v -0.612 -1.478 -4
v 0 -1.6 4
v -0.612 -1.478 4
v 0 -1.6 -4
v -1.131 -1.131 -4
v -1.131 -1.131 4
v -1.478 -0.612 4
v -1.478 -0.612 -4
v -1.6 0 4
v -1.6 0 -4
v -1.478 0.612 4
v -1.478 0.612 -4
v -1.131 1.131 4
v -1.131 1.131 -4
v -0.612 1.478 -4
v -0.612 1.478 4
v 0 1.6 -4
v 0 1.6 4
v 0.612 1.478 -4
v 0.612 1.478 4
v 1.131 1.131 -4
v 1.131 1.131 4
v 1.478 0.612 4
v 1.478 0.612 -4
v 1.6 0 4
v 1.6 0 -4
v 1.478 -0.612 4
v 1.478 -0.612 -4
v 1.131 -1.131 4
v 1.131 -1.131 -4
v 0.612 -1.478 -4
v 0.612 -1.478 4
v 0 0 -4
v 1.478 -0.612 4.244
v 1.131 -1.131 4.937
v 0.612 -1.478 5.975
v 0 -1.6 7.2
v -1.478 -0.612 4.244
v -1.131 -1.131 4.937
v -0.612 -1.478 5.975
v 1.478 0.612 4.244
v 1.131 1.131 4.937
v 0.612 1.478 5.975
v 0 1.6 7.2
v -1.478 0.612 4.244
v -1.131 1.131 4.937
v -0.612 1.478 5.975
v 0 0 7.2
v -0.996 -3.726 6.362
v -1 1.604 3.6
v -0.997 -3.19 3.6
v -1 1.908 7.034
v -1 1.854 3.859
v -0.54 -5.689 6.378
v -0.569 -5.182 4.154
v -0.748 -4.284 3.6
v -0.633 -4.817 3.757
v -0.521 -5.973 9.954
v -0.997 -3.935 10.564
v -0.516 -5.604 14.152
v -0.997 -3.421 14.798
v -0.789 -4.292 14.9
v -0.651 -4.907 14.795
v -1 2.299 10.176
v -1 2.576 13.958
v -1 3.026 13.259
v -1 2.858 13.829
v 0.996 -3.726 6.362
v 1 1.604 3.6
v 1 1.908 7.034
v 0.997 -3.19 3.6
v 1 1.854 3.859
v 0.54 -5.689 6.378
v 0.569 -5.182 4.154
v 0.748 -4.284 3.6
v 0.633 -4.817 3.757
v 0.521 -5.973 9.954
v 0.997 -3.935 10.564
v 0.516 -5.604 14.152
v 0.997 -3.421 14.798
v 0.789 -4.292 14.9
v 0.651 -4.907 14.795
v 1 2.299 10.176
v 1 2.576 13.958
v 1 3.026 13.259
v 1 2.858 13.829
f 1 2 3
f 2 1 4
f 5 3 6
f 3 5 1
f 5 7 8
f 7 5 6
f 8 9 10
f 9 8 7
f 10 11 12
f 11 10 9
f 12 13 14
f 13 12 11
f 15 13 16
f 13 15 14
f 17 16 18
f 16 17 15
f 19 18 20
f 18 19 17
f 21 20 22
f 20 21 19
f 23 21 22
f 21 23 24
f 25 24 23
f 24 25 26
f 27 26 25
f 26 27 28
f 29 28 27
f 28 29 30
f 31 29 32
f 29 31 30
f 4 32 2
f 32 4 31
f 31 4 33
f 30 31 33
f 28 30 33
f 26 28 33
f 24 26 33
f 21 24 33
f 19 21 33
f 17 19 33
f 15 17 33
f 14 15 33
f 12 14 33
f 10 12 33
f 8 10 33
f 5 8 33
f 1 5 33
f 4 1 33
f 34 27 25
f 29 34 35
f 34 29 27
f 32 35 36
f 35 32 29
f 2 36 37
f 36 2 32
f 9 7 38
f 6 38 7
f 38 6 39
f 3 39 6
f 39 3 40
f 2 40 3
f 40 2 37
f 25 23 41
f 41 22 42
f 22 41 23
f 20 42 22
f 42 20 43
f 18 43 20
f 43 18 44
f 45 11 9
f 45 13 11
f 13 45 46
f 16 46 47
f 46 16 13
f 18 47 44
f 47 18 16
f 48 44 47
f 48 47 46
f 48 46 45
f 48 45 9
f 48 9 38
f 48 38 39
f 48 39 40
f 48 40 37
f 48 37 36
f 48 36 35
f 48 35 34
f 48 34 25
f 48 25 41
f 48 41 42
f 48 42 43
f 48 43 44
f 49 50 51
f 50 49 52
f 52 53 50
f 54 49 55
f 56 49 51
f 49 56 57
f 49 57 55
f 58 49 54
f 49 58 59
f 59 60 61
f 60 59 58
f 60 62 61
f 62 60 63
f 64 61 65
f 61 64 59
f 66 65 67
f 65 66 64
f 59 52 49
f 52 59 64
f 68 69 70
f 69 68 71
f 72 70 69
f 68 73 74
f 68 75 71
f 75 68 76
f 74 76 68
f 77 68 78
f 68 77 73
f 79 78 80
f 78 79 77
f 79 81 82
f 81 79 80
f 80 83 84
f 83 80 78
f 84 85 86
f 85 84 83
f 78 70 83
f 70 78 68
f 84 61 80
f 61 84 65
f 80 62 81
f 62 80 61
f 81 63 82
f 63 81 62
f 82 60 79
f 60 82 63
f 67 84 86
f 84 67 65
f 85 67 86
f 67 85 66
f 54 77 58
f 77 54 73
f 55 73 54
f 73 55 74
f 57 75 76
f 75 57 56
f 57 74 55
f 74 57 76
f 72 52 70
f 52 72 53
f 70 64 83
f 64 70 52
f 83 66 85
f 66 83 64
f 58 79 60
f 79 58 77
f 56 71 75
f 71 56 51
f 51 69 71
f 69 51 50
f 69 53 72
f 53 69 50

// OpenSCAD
// file: ../p/4-4edge.scad
use <../lib.scad>
function ldraw_lib__4_4edge() = [
// 0 Circle 1.0
// 0 Name: 4-4edge.dat
// 0 Author: James Jessiman
// 0 !LDRAW_ORG Primitive UPDATE 2017-01
// 0 !LICENSE Licensed under CC BY 4.0 : see CAreadme.txt
// 
// 0 BFC CERTIFY CCW
  [0,"BFC","CERTIFY"],
  [0,"BFC","CCW"],
// 
// 0 !HISTORY 1998-12-15 [PTadmin] Official Update 1998-10
// 0 !HISTORY 2005-12-28 [PTadmin] Official Update 2005-01
// 0 !HISTORY 2007-06-24 [PTadmin] Header formatted for Contributor Agreement
// 0 !HISTORY 2008-07-01 [PTadmin] Official Update 2008-01
// 0 !HISTORY 2017-01-15 [Steffen] BFCed
// 0 !HISTORY 2017-12-30 [PTadmin] Official Update 2017-01
// 
// 
// 2 24 1 0 0 0.9239 0 0.3827
  [2,24,1,0,0,0.9239,0,0.3827],
// 2 24 0.9239 0 0.3827 0.7071 0 0.7071
  [2,24,0.9239,0,0.3827,0.7071,0,0.7071],
// 2 24 0.7071 0 0.7071 0.3827 0 0.9239
  [2,24,0.7071,0,0.7071,0.3827,0,0.9239],
// 2 24 0.3827 0 0.9239 0 0 1
  [2,24,0.3827,0,0.9239,0,0,1],
// 2 24 0 0 1 -0.3827 0 0.9239
  [2,24,0,0,1,-0.3827,0,0.9239],
// 2 24 -0.3827 0 0.9239 -0.7071 0 0.7071
  [2,24,-0.3827,0,0.9239,-0.7071,0,0.7071],
// 2 24 -0.7071 0 0.7071 -0.9239 0 0.3827
  [2,24,-0.7071,0,0.7071,-0.9239,0,0.3827],
// 2 24 -0.9239 0 0.3827 -1 0 -0
  [2,24,-0.9239,0,0.3827,-1,0,-0],
// 2 24 -1 0 -0 -0.9239 0 -0.3827
  [2,24,-1,0,-0,-0.9239,0,-0.3827],
// 2 24 -0.9239 0 -0.3827 -0.7071 0 -0.7071
  [2,24,-0.9239,0,-0.3827,-0.7071,0,-0.7071],
// 2 24 -0.7071 0 -0.7071 -0.3827 0 -0.9239
  [2,24,-0.7071,0,-0.7071,-0.3827,0,-0.9239],
// 2 24 -0.3827 0 -0.9239 0 0 -1
  [2,24,-0.3827,0,-0.9239,0,0,-1],
// 2 24 0 0 -1 0.3827 0 -0.9239
  [2,24,0,0,-1,0.3827,0,-0.9239],
// 2 24 0.3827 0 -0.9239 0.7071 0 -0.7071
  [2,24,0.3827,0,-0.9239,0.7071,0,-0.7071],
// 2 24 0.7071 0 -0.7071 0.9239 0 -0.3827
  [2,24,0.7071,0,-0.7071,0.9239,0,-0.3827],
// 2 24 0.9239 0 -0.3827 1 0 0
  [2,24,0.9239,0,-0.3827,1,0,0],
];
module ldraw_lib__4_4edge(step=0, col=false, unit=2/5, alt=false, line=0.2, solid=!$preview)
    makepoly(ldraw_lib__4_4edge(), step=step, col=col, unit=unit, alt=alt, line=line, solid=solid);
ldraw_lib__4_4edge(line=0.2);
// file: ../p/4-4disc.scad
use <../lib.scad>
function ldraw_lib__4_4disc() = [
// 0 Disc 1.0
// 0 Name: 4-4disc.dat
// 0 Author: James Jessiman
// 0 !LDRAW_ORG Primitive UPDATE 2002-02
// 0 !LICENSE Licensed under CC BY 4.0 : see CAreadme.txt
// 
// 0 BFC CERTIFY CCW
  [0,"BFC","CERTIFY"],
  [0,"BFC","CCW"],
// 
// 0 !HISTORY 1998-12-15 [PTadmin] Official Update 1998-10
// 0 !HISTORY 2002-03-23 [sbliss] Added BFC statement
// 0 !HISTORY 2002-04-25 [PTadmin] Official Update 2002-02
// 0 !HISTORY 2007-06-24 [PTadmin] Header formatted for Contributor Agreement
// 0 !HISTORY 2008-07-01 [PTadmin] Official Update 2008-01
// 
// 
// 3 16 0 0 0 1 0 0 0.9239 0 0.3827
  [3,16,0,0,0,1,0,0,0.9239,0,0.3827],
// 3 16 0 0 0 0.9239 0 0.3827 0.7071 0 0.7071
  [3,16,0,0,0,0.9239,0,0.3827,0.7071,0,0.7071],
// 3 16 0 0 0 0.7071 0 0.7071 0.3827 0 0.9239
  [3,16,0,0,0,0.7071,0,0.7071,0.3827,0,0.9239],
// 3 16 0 0 0 0.3827 0 0.9239 0 0 1
  [3,16,0,0,0,0.3827,0,0.9239,0,0,1],
// 3 16 0 0 0 0 0 1 -0.3827 0 0.9239
  [3,16,0,0,0,0,0,1,-0.3827,0,0.9239],
// 3 16 0 0 0 -0.3827 0 0.9239 -0.7071 0 0.7071
  [3,16,0,0,0,-0.3827,0,0.9239,-0.7071,0,0.7071],
// 3 16 0 0 0 -0.7071 0 0.7071 -0.9239 0 0.3827
  [3,16,0,0,0,-0.7071,0,0.7071,-0.9239,0,0.3827],
// 3 16 0 0 0 -0.9239 0 0.3827 -1 0 -0
  [3,16,0,0,0,-0.9239,0,0.3827,-1,0,-0],
// 3 16 0 0 0 -1 0 -0 -0.9239 0 -0.3827
  [3,16,0,0,0,-1,0,-0,-0.9239,0,-0.3827],
// 3 16 0 0 0 -0.9239 0 -0.3827 -0.7071 0 -0.7071
  [3,16,0,0,0,-0.9239,0,-0.3827,-0.7071,0,-0.7071],
// 3 16 0 0 0 -0.7071 0 -0.7071 -0.3827 0 -0.9239
  [3,16,0,0,0,-0.7071,0,-0.7071,-0.3827,0,-0.9239],
// 3 16 0 0 0 -0.3827 0 -0.9239 0 0 -1
  [3,16,0,0,0,-0.3827,0,-0.9239,0,0,-1],
// 3 16 0 0 0 0 0 -1 0.3827 0 -0.9239
  [3,16,0,0,0,0,0,-1,0.3827,0,-0.9239],
// 3 16 0 0 0 0.3827 0 -0.9239 0.7071 0 -0.7071
  [3,16,0,0,0,0.3827,0,-0.9239,0.7071,0,-0.7071],
// 3 16 0 0 0 0.7071 0 -0.7071 0.9239 0 -0.3827
  [3,16,0,0,0,0.7071,0,-0.7071,0.9239,0,-0.3827],
// 3 16 0 0 0 0.9239 0 -0.3827 1 0 0
  [3,16,0,0,0,0.9239,0,-0.3827,1,0,0],
// 0
];
module ldraw_lib__4_4disc(step=0, col=false, unit=2/5, alt=false, line=0.2, solid=!$preview)
    makepoly(ldraw_lib__4_4disc(), step=step, col=col, unit=unit, alt=alt, line=line, solid=solid);
ldraw_lib__4_4disc(line=0.2);
// file: ../p/4-4cyli.scad
use <../lib.scad>
function ldraw_lib__4_4cyli() = [
// 0 Cylinder 1.0
// 0 Name: 4-4cyli.dat
// 0 Author: James Jessiman
// 0 !LDRAW_ORG Primitive UPDATE 2005-01
// 0 !LICENSE Licensed under CC BY 4.0 : see CAreadme.txt
// 
// 0 BFC CERTIFY CCW
  [0,"BFC","CERTIFY"],
  [0,"BFC","CCW"],
// 
// 0 !HISTORY 1998-12-15 [PTadmin] Official Update 1998-10
// 0 !HISTORY 2002-03-23 [sbliss] Added BFC statement; merged headers from files in distributions LDraw 0.27 and Complete.
// 0 !HISTORY 2002-04-25 [PTadmin] Official Update 2002-02
// 0 !HISTORY 2004-12-14 [guyvivan] BFC CCW
// 0 !HISTORY 2005-12-28 [PTadmin] Official Update 2005-01
// 0 !HISTORY 2007-06-24 [PTadmin] Header formatted for Contributor Agreement
// 0 !HISTORY 2008-07-01 [PTadmin] Official Update 2008-01
// 
// 
// 4 16 1 1 0 0.9239 1 0.3827 0.9239 0 0.3827 1 0 0
  [4,16,1,1,0,0.9239,1,0.3827,0.9239,0,0.3827,1,0,0],
// 5 24 1 0 0 1 1 0 0.9239 0 0.3827 0.9239 0 -0.3827
  [5,24,1,0,0,1,1,0,0.9239,0,0.3827,0.9239,0,-0.3827],
// 4 16 0.9239 1 0.3827 0.7071 1 0.7071 0.7071 0 0.7071 0.9239 0 0.3827
  [4,16,0.9239,1,0.3827,0.7071,1,0.7071,0.7071,0,0.7071,0.9239,0,0.3827],
// 5 24 0.9239 0 0.3827 0.9239 1 0.3827 0.7071 0 0.7071 1 0 0
  [5,24,0.9239,0,0.3827,0.9239,1,0.3827,0.7071,0,0.7071,1,0,0],
// 4 16 0.7071 1 0.7071 0.3827 1 0.9239 0.3827 0 0.9239 0.7071 0 0.7071
  [4,16,0.7071,1,0.7071,0.3827,1,0.9239,0.3827,0,0.9239,0.7071,0,0.7071],
// 5 24 0.7071 0 0.7071 0.7071 1 0.7071 0.3827 0 0.9239 0.9239 0 0.3827
  [5,24,0.7071,0,0.7071,0.7071,1,0.7071,0.3827,0,0.9239,0.9239,0,0.3827],
// 4 16 0.3827 1 0.9239 0 1 1 0 0 1 0.3827 0 0.9239
  [4,16,0.3827,1,0.9239,0,1,1,0,0,1,0.3827,0,0.9239],
// 5 24 0.3827 0 0.9239 0.3827 1 0.9239 0 0 1 0.7071 0 0.7071
  [5,24,0.3827,0,0.9239,0.3827,1,0.9239,0,0,1,0.7071,0,0.7071],
// 4 16 0 1 1 -0.3827 1 0.9239 -0.3827 0 0.9239 0 0 1
  [4,16,0,1,1,-0.3827,1,0.9239,-0.3827,0,0.9239,0,0,1],
// 5 24 0 0 1 0 1 1 -0.3827 0 0.9239 0.3827 0 0.9239
  [5,24,0,0,1,0,1,1,-0.3827,0,0.9239,0.3827,0,0.9239],
// 4 16 -0.3827 1 0.9239 -0.7071 1 0.7071 -0.7071 0 0.7071 -0.3827 0 0.9239
  [4,16,-0.3827,1,0.9239,-0.7071,1,0.7071,-0.7071,0,0.7071,-0.3827,0,0.9239],
// 5 24 -0.3827 0 0.9239 -0.3827 1 0.9239 -0.7071 0 0.7071 0 0 1
  [5,24,-0.3827,0,0.9239,-0.3827,1,0.9239,-0.7071,0,0.7071,0,0,1],
// 4 16 -0.7071 1 0.7071 -0.9239 1 0.3827 -0.9239 0 0.3827 -0.7071 0 0.7071
  [4,16,-0.7071,1,0.7071,-0.9239,1,0.3827,-0.9239,0,0.3827,-0.7071,0,0.7071],
// 5 24 -0.7071 0 0.7071 -0.7071 1 0.7071 -0.9239 0 0.3827 -0.3827 0 0.9239
  [5,24,-0.7071,0,0.7071,-0.7071,1,0.7071,-0.9239,0,0.3827,-0.3827,0,0.9239],
// 4 16 -0.9239 1 0.3827 -1 1 0 -1 0 0 -0.9239 0 0.3827
  [4,16,-0.9239,1,0.3827,-1,1,0,-1,0,0,-0.9239,0,0.3827],
// 5 24 -0.9239 0 0.3827 -0.9239 1 0.3827 -1 0 0 -0.7071 0 0.7071
  [5,24,-0.9239,0,0.3827,-0.9239,1,0.3827,-1,0,0,-0.7071,0,0.7071],
// 4 16 -1 1 0 -0.9239 1 -0.3827 -0.9239 0 -0.3827 -1 0 0
  [4,16,-1,1,0,-0.9239,1,-0.3827,-0.9239,0,-0.3827,-1,0,0],
// 5 24 -1 0 0 -1 1 0 -0.9239 0 -0.3827 -0.9239 0 0.3827
  [5,24,-1,0,0,-1,1,0,-0.9239,0,-0.3827,-0.9239,0,0.3827],
// 4 16 -0.9239 1 -0.3827 -0.7071 1 -0.7071 -0.7071 0 -0.7071 -0.9239 0 -0.3827
  [4,16,-0.9239,1,-0.3827,-0.7071,1,-0.7071,-0.7071,0,-0.7071,-0.9239,0,-0.3827],
// 5 24 -0.9239 0 -0.3827 -0.9239 1 -0.3827 -0.7071 0 -0.7071 -1 0 0
  [5,24,-0.9239,0,-0.3827,-0.9239,1,-0.3827,-0.7071,0,-0.7071,-1,0,0],
// 4 16 -0.7071 1 -0.7071 -0.3827 1 -0.9239 -0.3827 0 -0.9239 -0.7071 0 -0.7071
  [4,16,-0.7071,1,-0.7071,-0.3827,1,-0.9239,-0.3827,0,-0.9239,-0.7071,0,-0.7071],
// 5 24 -0.7071 0 -0.7071 -0.7071 1 -0.7071 -0.3827 0 -0.9239 -0.9239 0 -0.3827
  [5,24,-0.7071,0,-0.7071,-0.7071,1,-0.7071,-0.3827,0,-0.9239,-0.9239,0,-0.3827],
// 4 16 -0.3827 1 -0.9239 0 1 -1 0 0 -1 -0.3827 0 -0.9239
  [4,16,-0.3827,1,-0.9239,0,1,-1,0,0,-1,-0.3827,0,-0.9239],
// 5 24 -0.3827 0 -0.9239 -0.3827 1 -0.9239 0 0 -1 -0.7071 0 -0.7071
  [5,24,-0.3827,0,-0.9239,-0.3827,1,-0.9239,0,0,-1,-0.7071,0,-0.7071],
// 4 16 0 1 -1 0.3827 1 -0.9239 0.3827 0 -0.9239 0 0 -1
  [4,16,0,1,-1,0.3827,1,-0.9239,0.3827,0,-0.9239,0,0,-1],
// 5 24 0 0 -1 0 1 -1 0.3827 0 -0.9239 -0.3827 0 -0.9239
  [5,24,0,0,-1,0,1,-1,0.3827,0,-0.9239,-0.3827,0,-0.9239],
// 4 16 0.3827 1 -0.9239 0.7071 1 -0.7071 0.7071 0 -0.7071 0.3827 0 -0.9239
  [4,16,0.3827,1,-0.9239,0.7071,1,-0.7071,0.7071,0,-0.7071,0.3827,0,-0.9239],
// 5 24 0.3827 0 -0.9239 0.3827 1 -0.9239 0.7071 0 -0.7071 0 0 -1
  [5,24,0.3827,0,-0.9239,0.3827,1,-0.9239,0.7071,0,-0.7071,0,0,-1],
// 4 16 0.7071 1 -0.7071 0.9239 1 -0.3827 0.9239 0 -0.3827 0.7071 0 -0.7071
  [4,16,0.7071,1,-0.7071,0.9239,1,-0.3827,0.9239,0,-0.3827,0.7071,0,-0.7071],
// 5 24 0.7071 0 -0.7071 0.7071 1 -0.7071 0.9239 0 -0.3827 0.3827 0 -0.9239
  [5,24,0.7071,0,-0.7071,0.7071,1,-0.7071,0.9239,0,-0.3827,0.3827,0,-0.9239],
// 4 16 0.9239 1 -0.3827 1 1 0 1 0 0 0.9239 0 -0.3827
  [4,16,0.9239,1,-0.3827,1,1,0,1,0,0,0.9239,0,-0.3827],
// 5 24 0.9239 0 -0.3827 0.9239 1 -0.3827 1 0 0 0.7071 0 -0.7071
  [5,24,0.9239,0,-0.3827,0.9239,1,-0.3827,1,0,0,0.7071,0,-0.7071],
// 0
];
module ldraw_lib__4_4cyli(step=0, col=false, unit=2/5, alt=false, line=0.2, solid=!$preview)
    makepoly(ldraw_lib__4_4cyli(), step=step, col=col, unit=unit, alt=alt, line=line, solid=solid);
ldraw_lib__4_4cyli(line=0.2);
// file: ../p/2-4edge.scad
use <../lib.scad>
function ldraw_lib__2_4edge() = [
// 0 Circle 0.5
// 0 Name: 2-4edge.dat
// 0 Author: James Jessiman
// 0 !LDRAW_ORG Primitive UPDATE 2017-01
// 0 !LICENSE Licensed under CC BY 4.0 : see CAreadme.txt
// 
// 0 BFC CERTIFY CCW
  [0,"BFC","CERTIFY"],
  [0,"BFC","CCW"],
// 
// 0 !HISTORY 2007-06-24 [PTadmin] Header formatted for Contributor Agreement
// 0 !HISTORY 2008-07-01 [PTadmin] Official Update 2008-01
// 0 !HISTORY 2017-01-15 [Steffen] BFCed
// 0 !HISTORY 2017-12-30 [PTadmin] Official Update 2017-01
// 
// 
// 2 24 1 0 0 0.9239 0 0.3827
  [2,24,1,0,0,0.9239,0,0.3827],
// 2 24 0.9239 0 0.3827 0.7071 0 0.7071
  [2,24,0.9239,0,0.3827,0.7071,0,0.7071],
// 2 24 0.7071 0 0.7071 0.3827 0 0.9239
  [2,24,0.7071,0,0.7071,0.3827,0,0.9239],
// 2 24 0.3827 0 0.9239 0 0 1
  [2,24,0.3827,0,0.9239,0,0,1],
// 2 24 0 0 1 -0.3827 0 0.9239
  [2,24,0,0,1,-0.3827,0,0.9239],
// 2 24 -0.3827 0 0.9239 -0.7071 0 0.7071
  [2,24,-0.3827,0,0.9239,-0.7071,0,0.7071],
// 2 24 -0.7071 0 0.7071 -0.9239 0 0.3827
  [2,24,-0.7071,0,0.7071,-0.9239,0,0.3827],
// 2 24 -0.9239 0 0.3827 -1 0 0
  [2,24,-0.9239,0,0.3827,-1,0,0],
];
module ldraw_lib__2_4edge(step=0, col=false, unit=2/5, alt=false, line=0.2, solid=!$preview)
    makepoly(ldraw_lib__2_4edge(), step=step, col=col, unit=unit, alt=alt, line=line, solid=solid);
ldraw_lib__2_4edge(line=0.2);
// file: ../p/2-4disc.scad
use <../lib.scad>
function ldraw_lib__2_4disc() = [
// 0 Disc 0.5
// 0 Name: 2-4disc.dat
// 0 Author: James Jessiman
// 0 !LDRAW_ORG Primitive UPDATE 2002-02
// 0 !LICENSE Licensed under CC BY 4.0 : see CAreadme.txt
// 
// 0 BFC CERTIFY CCW
  [0,"BFC","CERTIFY"],
  [0,"BFC","CCW"],
// 
// 0 !HISTORY 1998-12-15 [PTadmin] Official Update 1998-10
// 0 !HISTORY 2002-03-23 [sbliss] Added BFC statement
// 0 !HISTORY 2002-04-25 [PTadmin] Official Update 2002-02
// 0 !HISTORY 2007-06-24 [PTadmin] Header formatted for Contributor Agreement
// 0 !HISTORY 2008-07-01 [PTadmin] Official Update 2008-01
// 
// 
// 3 16 0 0 0 1 0 0 0.9239 0 0.3827
  [3,16,0,0,0,1,0,0,0.9239,0,0.3827],
// 3 16 0 0 0 0.9239 0 0.3827 0.7071 0 0.7071
  [3,16,0,0,0,0.9239,0,0.3827,0.7071,0,0.7071],
// 3 16 0 0 0 0.7071 0 0.7071 0.3827 0 0.9239
  [3,16,0,0,0,0.7071,0,0.7071,0.3827,0,0.9239],
// 3 16 0 0 0 0.3827 0 0.9239 0 0 1
  [3,16,0,0,0,0.3827,0,0.9239,0,0,1],
// 3 16 0 0 0 0 0 1 -0.3827 0 0.9239
  [3,16,0,0,0,0,0,1,-0.3827,0,0.9239],
// 3 16 0 0 0 -0.3827 0 0.9239 -0.7071 0 0.7071
  [3,16,0,0,0,-0.3827,0,0.9239,-0.7071,0,0.7071],
// 3 16 0 0 0 -0.7071 0 0.7071 -0.9239 0 0.3827
  [3,16,0,0,0,-0.7071,0,0.7071,-0.9239,0,0.3827],
// 3 16 0 0 0 -0.9239 0 0.3827 -1 0 -0
  [3,16,0,0,0,-0.9239,0,0.3827,-1,0,-0],
// 0
];
module ldraw_lib__2_4disc(step=0, col=false, unit=2/5, alt=false, line=0.2, solid=!$preview)
    makepoly(ldraw_lib__2_4disc(), step=step, col=col, unit=unit, alt=alt, line=line, solid=solid);
ldraw_lib__2_4disc(line=0.2);
// file: ../p/1-4cyls.scad
use <../lib.scad>
function ldraw_lib__1_4cyls() = [
// 0 Cylinder Sloped 0.25
// 0 Name: 1-4cyls.dat
// 0 Author: James Jessiman
// 0 !LDRAW_ORG Primitive UPDATE 2012-01
// 0 !LICENSE Licensed under CC BY 4.0 : see CAreadme.txt
// 
// 0 BFC CERTIFY CCW
  [0,"BFC","CERTIFY"],
  [0,"BFC","CCW"],
// 
// 0 !HISTORY 1998-12-15 [PTadmin] Official Update 1998-10
// 0 !HISTORY 2002-07-03 [sbliss] Added BFC statement
// 0 !HISTORY 2002-08-18 [PTadmin] Official Update 2002-04
// 0 !HISTORY 2007-06-22 [PTadmin] Header formatted for Contributor Agreement
// 0 !HISTORY 2008-07-01 [PTadmin] Official Update 2008-01
// 0 !HISTORY 2012-02-16 [Philo] Changed to CCW
// 0 !HISTORY 2012-03-30 [PTadmin] Official Update 2012-01
// 
// 
// 3 16 0.9239 0.0761 0.3827 0.9239 0 0.3827 1 0 0
  [3,16,0.9239,0.0761,0.3827,0.9239,0,0.3827,1,0,0],
// 4 16 0.9239 0.0761 0.3827 0.7071 0.2929 0.7071 0.7071 0 0.7071 0.9239 0 0.3827
  [4,16,0.9239,0.0761,0.3827,0.7071,0.2929,0.7071,0.7071,0,0.7071,0.9239,0,0.3827],
// 4 16 0.7071 0.2929 0.7071 0.3827 0.6173 0.9239 0.3827 0 0.9239 0.7071 0 0.7071
  [4,16,0.7071,0.2929,0.7071,0.3827,0.6173,0.9239,0.3827,0,0.9239,0.7071,0,0.7071],
// 4 16 0.3827 0.6173 0.9239 0 1 1 0 0 1 0.3827 0 0.9239
  [4,16,0.3827,0.6173,0.9239,0,1,1,0,0,1,0.3827,0,0.9239],
// 
// 5 24 0.9239 0 0.3827 0.9239 0.0761 0.3827 0.7071 0 0.7071 1 0 0
  [5,24,0.9239,0,0.3827,0.9239,0.0761,0.3827,0.7071,0,0.7071,1,0,0],
// 5 24 0.7071 0 0.7071 0.7071 0.2929 0.7071 0.3827 0 0.9239 0.9239 0 0.3827
  [5,24,0.7071,0,0.7071,0.7071,0.2929,0.7071,0.3827,0,0.9239,0.9239,0,0.3827],
// 5 24 0.3827 0 0.9239 0.3827 0.6173 0.9239 0 0 1 0.7071 0 0.7071
  [5,24,0.3827,0,0.9239,0.3827,0.6173,0.9239,0,0,1,0.7071,0,0.7071],
// 5 24 0 0 1 0 1 1 0.3827 0 0.9239 -1 0 1
  [5,24,0,0,1,0,1,1,0.3827,0,0.9239,-1,0,1],
];
module ldraw_lib__1_4cyls(step=0, col=false, unit=2/5, alt=false, line=0.2, solid=!$preview)
    makepoly(ldraw_lib__1_4cyls(), step=step, col=col, unit=unit, alt=alt, line=line, solid=solid);
ldraw_lib__1_4cyls(line=0.2);
// main file
use <../lib.scad>
use <98369.scad>
function ldraw_lib__79811() = [
// 0 =Minifig Cleaver
// 0 Name: 79811.dat
// 0 Author: Vincent Messenet [Cheenzo]
// 0 !LDRAW_ORG Part Alias UPDATE 2024-01
// 0 !LICENSE Licensed under CC BY 4.0 : see CAreadme.txt
// 
// 0 BFC CERTIFY CCW
  [0,"BFC","CERTIFY"],
  [0,"BFC","CCW"],
// 
// 0 !HISTORY 2024-01-29 [OrionP] Official Update 2024-01
// 
// 1 16 0 0 0 1 0 0 0 1 0 0 0 1 98369.dat
  [1,16,0,0,0,1,0,0,0,1,0,0,0,1, ldraw_lib__98369()],
];
module ldraw_lib__79811(step=0, col=false, unit=2/5, alt=false, line=0.2, solid=!$preview)
    makepoly(ldraw_lib__79811(), step=step, col=col, unit=unit, alt=alt, line=line, solid=solid);
ldraw_lib__79811(line=0.2);
